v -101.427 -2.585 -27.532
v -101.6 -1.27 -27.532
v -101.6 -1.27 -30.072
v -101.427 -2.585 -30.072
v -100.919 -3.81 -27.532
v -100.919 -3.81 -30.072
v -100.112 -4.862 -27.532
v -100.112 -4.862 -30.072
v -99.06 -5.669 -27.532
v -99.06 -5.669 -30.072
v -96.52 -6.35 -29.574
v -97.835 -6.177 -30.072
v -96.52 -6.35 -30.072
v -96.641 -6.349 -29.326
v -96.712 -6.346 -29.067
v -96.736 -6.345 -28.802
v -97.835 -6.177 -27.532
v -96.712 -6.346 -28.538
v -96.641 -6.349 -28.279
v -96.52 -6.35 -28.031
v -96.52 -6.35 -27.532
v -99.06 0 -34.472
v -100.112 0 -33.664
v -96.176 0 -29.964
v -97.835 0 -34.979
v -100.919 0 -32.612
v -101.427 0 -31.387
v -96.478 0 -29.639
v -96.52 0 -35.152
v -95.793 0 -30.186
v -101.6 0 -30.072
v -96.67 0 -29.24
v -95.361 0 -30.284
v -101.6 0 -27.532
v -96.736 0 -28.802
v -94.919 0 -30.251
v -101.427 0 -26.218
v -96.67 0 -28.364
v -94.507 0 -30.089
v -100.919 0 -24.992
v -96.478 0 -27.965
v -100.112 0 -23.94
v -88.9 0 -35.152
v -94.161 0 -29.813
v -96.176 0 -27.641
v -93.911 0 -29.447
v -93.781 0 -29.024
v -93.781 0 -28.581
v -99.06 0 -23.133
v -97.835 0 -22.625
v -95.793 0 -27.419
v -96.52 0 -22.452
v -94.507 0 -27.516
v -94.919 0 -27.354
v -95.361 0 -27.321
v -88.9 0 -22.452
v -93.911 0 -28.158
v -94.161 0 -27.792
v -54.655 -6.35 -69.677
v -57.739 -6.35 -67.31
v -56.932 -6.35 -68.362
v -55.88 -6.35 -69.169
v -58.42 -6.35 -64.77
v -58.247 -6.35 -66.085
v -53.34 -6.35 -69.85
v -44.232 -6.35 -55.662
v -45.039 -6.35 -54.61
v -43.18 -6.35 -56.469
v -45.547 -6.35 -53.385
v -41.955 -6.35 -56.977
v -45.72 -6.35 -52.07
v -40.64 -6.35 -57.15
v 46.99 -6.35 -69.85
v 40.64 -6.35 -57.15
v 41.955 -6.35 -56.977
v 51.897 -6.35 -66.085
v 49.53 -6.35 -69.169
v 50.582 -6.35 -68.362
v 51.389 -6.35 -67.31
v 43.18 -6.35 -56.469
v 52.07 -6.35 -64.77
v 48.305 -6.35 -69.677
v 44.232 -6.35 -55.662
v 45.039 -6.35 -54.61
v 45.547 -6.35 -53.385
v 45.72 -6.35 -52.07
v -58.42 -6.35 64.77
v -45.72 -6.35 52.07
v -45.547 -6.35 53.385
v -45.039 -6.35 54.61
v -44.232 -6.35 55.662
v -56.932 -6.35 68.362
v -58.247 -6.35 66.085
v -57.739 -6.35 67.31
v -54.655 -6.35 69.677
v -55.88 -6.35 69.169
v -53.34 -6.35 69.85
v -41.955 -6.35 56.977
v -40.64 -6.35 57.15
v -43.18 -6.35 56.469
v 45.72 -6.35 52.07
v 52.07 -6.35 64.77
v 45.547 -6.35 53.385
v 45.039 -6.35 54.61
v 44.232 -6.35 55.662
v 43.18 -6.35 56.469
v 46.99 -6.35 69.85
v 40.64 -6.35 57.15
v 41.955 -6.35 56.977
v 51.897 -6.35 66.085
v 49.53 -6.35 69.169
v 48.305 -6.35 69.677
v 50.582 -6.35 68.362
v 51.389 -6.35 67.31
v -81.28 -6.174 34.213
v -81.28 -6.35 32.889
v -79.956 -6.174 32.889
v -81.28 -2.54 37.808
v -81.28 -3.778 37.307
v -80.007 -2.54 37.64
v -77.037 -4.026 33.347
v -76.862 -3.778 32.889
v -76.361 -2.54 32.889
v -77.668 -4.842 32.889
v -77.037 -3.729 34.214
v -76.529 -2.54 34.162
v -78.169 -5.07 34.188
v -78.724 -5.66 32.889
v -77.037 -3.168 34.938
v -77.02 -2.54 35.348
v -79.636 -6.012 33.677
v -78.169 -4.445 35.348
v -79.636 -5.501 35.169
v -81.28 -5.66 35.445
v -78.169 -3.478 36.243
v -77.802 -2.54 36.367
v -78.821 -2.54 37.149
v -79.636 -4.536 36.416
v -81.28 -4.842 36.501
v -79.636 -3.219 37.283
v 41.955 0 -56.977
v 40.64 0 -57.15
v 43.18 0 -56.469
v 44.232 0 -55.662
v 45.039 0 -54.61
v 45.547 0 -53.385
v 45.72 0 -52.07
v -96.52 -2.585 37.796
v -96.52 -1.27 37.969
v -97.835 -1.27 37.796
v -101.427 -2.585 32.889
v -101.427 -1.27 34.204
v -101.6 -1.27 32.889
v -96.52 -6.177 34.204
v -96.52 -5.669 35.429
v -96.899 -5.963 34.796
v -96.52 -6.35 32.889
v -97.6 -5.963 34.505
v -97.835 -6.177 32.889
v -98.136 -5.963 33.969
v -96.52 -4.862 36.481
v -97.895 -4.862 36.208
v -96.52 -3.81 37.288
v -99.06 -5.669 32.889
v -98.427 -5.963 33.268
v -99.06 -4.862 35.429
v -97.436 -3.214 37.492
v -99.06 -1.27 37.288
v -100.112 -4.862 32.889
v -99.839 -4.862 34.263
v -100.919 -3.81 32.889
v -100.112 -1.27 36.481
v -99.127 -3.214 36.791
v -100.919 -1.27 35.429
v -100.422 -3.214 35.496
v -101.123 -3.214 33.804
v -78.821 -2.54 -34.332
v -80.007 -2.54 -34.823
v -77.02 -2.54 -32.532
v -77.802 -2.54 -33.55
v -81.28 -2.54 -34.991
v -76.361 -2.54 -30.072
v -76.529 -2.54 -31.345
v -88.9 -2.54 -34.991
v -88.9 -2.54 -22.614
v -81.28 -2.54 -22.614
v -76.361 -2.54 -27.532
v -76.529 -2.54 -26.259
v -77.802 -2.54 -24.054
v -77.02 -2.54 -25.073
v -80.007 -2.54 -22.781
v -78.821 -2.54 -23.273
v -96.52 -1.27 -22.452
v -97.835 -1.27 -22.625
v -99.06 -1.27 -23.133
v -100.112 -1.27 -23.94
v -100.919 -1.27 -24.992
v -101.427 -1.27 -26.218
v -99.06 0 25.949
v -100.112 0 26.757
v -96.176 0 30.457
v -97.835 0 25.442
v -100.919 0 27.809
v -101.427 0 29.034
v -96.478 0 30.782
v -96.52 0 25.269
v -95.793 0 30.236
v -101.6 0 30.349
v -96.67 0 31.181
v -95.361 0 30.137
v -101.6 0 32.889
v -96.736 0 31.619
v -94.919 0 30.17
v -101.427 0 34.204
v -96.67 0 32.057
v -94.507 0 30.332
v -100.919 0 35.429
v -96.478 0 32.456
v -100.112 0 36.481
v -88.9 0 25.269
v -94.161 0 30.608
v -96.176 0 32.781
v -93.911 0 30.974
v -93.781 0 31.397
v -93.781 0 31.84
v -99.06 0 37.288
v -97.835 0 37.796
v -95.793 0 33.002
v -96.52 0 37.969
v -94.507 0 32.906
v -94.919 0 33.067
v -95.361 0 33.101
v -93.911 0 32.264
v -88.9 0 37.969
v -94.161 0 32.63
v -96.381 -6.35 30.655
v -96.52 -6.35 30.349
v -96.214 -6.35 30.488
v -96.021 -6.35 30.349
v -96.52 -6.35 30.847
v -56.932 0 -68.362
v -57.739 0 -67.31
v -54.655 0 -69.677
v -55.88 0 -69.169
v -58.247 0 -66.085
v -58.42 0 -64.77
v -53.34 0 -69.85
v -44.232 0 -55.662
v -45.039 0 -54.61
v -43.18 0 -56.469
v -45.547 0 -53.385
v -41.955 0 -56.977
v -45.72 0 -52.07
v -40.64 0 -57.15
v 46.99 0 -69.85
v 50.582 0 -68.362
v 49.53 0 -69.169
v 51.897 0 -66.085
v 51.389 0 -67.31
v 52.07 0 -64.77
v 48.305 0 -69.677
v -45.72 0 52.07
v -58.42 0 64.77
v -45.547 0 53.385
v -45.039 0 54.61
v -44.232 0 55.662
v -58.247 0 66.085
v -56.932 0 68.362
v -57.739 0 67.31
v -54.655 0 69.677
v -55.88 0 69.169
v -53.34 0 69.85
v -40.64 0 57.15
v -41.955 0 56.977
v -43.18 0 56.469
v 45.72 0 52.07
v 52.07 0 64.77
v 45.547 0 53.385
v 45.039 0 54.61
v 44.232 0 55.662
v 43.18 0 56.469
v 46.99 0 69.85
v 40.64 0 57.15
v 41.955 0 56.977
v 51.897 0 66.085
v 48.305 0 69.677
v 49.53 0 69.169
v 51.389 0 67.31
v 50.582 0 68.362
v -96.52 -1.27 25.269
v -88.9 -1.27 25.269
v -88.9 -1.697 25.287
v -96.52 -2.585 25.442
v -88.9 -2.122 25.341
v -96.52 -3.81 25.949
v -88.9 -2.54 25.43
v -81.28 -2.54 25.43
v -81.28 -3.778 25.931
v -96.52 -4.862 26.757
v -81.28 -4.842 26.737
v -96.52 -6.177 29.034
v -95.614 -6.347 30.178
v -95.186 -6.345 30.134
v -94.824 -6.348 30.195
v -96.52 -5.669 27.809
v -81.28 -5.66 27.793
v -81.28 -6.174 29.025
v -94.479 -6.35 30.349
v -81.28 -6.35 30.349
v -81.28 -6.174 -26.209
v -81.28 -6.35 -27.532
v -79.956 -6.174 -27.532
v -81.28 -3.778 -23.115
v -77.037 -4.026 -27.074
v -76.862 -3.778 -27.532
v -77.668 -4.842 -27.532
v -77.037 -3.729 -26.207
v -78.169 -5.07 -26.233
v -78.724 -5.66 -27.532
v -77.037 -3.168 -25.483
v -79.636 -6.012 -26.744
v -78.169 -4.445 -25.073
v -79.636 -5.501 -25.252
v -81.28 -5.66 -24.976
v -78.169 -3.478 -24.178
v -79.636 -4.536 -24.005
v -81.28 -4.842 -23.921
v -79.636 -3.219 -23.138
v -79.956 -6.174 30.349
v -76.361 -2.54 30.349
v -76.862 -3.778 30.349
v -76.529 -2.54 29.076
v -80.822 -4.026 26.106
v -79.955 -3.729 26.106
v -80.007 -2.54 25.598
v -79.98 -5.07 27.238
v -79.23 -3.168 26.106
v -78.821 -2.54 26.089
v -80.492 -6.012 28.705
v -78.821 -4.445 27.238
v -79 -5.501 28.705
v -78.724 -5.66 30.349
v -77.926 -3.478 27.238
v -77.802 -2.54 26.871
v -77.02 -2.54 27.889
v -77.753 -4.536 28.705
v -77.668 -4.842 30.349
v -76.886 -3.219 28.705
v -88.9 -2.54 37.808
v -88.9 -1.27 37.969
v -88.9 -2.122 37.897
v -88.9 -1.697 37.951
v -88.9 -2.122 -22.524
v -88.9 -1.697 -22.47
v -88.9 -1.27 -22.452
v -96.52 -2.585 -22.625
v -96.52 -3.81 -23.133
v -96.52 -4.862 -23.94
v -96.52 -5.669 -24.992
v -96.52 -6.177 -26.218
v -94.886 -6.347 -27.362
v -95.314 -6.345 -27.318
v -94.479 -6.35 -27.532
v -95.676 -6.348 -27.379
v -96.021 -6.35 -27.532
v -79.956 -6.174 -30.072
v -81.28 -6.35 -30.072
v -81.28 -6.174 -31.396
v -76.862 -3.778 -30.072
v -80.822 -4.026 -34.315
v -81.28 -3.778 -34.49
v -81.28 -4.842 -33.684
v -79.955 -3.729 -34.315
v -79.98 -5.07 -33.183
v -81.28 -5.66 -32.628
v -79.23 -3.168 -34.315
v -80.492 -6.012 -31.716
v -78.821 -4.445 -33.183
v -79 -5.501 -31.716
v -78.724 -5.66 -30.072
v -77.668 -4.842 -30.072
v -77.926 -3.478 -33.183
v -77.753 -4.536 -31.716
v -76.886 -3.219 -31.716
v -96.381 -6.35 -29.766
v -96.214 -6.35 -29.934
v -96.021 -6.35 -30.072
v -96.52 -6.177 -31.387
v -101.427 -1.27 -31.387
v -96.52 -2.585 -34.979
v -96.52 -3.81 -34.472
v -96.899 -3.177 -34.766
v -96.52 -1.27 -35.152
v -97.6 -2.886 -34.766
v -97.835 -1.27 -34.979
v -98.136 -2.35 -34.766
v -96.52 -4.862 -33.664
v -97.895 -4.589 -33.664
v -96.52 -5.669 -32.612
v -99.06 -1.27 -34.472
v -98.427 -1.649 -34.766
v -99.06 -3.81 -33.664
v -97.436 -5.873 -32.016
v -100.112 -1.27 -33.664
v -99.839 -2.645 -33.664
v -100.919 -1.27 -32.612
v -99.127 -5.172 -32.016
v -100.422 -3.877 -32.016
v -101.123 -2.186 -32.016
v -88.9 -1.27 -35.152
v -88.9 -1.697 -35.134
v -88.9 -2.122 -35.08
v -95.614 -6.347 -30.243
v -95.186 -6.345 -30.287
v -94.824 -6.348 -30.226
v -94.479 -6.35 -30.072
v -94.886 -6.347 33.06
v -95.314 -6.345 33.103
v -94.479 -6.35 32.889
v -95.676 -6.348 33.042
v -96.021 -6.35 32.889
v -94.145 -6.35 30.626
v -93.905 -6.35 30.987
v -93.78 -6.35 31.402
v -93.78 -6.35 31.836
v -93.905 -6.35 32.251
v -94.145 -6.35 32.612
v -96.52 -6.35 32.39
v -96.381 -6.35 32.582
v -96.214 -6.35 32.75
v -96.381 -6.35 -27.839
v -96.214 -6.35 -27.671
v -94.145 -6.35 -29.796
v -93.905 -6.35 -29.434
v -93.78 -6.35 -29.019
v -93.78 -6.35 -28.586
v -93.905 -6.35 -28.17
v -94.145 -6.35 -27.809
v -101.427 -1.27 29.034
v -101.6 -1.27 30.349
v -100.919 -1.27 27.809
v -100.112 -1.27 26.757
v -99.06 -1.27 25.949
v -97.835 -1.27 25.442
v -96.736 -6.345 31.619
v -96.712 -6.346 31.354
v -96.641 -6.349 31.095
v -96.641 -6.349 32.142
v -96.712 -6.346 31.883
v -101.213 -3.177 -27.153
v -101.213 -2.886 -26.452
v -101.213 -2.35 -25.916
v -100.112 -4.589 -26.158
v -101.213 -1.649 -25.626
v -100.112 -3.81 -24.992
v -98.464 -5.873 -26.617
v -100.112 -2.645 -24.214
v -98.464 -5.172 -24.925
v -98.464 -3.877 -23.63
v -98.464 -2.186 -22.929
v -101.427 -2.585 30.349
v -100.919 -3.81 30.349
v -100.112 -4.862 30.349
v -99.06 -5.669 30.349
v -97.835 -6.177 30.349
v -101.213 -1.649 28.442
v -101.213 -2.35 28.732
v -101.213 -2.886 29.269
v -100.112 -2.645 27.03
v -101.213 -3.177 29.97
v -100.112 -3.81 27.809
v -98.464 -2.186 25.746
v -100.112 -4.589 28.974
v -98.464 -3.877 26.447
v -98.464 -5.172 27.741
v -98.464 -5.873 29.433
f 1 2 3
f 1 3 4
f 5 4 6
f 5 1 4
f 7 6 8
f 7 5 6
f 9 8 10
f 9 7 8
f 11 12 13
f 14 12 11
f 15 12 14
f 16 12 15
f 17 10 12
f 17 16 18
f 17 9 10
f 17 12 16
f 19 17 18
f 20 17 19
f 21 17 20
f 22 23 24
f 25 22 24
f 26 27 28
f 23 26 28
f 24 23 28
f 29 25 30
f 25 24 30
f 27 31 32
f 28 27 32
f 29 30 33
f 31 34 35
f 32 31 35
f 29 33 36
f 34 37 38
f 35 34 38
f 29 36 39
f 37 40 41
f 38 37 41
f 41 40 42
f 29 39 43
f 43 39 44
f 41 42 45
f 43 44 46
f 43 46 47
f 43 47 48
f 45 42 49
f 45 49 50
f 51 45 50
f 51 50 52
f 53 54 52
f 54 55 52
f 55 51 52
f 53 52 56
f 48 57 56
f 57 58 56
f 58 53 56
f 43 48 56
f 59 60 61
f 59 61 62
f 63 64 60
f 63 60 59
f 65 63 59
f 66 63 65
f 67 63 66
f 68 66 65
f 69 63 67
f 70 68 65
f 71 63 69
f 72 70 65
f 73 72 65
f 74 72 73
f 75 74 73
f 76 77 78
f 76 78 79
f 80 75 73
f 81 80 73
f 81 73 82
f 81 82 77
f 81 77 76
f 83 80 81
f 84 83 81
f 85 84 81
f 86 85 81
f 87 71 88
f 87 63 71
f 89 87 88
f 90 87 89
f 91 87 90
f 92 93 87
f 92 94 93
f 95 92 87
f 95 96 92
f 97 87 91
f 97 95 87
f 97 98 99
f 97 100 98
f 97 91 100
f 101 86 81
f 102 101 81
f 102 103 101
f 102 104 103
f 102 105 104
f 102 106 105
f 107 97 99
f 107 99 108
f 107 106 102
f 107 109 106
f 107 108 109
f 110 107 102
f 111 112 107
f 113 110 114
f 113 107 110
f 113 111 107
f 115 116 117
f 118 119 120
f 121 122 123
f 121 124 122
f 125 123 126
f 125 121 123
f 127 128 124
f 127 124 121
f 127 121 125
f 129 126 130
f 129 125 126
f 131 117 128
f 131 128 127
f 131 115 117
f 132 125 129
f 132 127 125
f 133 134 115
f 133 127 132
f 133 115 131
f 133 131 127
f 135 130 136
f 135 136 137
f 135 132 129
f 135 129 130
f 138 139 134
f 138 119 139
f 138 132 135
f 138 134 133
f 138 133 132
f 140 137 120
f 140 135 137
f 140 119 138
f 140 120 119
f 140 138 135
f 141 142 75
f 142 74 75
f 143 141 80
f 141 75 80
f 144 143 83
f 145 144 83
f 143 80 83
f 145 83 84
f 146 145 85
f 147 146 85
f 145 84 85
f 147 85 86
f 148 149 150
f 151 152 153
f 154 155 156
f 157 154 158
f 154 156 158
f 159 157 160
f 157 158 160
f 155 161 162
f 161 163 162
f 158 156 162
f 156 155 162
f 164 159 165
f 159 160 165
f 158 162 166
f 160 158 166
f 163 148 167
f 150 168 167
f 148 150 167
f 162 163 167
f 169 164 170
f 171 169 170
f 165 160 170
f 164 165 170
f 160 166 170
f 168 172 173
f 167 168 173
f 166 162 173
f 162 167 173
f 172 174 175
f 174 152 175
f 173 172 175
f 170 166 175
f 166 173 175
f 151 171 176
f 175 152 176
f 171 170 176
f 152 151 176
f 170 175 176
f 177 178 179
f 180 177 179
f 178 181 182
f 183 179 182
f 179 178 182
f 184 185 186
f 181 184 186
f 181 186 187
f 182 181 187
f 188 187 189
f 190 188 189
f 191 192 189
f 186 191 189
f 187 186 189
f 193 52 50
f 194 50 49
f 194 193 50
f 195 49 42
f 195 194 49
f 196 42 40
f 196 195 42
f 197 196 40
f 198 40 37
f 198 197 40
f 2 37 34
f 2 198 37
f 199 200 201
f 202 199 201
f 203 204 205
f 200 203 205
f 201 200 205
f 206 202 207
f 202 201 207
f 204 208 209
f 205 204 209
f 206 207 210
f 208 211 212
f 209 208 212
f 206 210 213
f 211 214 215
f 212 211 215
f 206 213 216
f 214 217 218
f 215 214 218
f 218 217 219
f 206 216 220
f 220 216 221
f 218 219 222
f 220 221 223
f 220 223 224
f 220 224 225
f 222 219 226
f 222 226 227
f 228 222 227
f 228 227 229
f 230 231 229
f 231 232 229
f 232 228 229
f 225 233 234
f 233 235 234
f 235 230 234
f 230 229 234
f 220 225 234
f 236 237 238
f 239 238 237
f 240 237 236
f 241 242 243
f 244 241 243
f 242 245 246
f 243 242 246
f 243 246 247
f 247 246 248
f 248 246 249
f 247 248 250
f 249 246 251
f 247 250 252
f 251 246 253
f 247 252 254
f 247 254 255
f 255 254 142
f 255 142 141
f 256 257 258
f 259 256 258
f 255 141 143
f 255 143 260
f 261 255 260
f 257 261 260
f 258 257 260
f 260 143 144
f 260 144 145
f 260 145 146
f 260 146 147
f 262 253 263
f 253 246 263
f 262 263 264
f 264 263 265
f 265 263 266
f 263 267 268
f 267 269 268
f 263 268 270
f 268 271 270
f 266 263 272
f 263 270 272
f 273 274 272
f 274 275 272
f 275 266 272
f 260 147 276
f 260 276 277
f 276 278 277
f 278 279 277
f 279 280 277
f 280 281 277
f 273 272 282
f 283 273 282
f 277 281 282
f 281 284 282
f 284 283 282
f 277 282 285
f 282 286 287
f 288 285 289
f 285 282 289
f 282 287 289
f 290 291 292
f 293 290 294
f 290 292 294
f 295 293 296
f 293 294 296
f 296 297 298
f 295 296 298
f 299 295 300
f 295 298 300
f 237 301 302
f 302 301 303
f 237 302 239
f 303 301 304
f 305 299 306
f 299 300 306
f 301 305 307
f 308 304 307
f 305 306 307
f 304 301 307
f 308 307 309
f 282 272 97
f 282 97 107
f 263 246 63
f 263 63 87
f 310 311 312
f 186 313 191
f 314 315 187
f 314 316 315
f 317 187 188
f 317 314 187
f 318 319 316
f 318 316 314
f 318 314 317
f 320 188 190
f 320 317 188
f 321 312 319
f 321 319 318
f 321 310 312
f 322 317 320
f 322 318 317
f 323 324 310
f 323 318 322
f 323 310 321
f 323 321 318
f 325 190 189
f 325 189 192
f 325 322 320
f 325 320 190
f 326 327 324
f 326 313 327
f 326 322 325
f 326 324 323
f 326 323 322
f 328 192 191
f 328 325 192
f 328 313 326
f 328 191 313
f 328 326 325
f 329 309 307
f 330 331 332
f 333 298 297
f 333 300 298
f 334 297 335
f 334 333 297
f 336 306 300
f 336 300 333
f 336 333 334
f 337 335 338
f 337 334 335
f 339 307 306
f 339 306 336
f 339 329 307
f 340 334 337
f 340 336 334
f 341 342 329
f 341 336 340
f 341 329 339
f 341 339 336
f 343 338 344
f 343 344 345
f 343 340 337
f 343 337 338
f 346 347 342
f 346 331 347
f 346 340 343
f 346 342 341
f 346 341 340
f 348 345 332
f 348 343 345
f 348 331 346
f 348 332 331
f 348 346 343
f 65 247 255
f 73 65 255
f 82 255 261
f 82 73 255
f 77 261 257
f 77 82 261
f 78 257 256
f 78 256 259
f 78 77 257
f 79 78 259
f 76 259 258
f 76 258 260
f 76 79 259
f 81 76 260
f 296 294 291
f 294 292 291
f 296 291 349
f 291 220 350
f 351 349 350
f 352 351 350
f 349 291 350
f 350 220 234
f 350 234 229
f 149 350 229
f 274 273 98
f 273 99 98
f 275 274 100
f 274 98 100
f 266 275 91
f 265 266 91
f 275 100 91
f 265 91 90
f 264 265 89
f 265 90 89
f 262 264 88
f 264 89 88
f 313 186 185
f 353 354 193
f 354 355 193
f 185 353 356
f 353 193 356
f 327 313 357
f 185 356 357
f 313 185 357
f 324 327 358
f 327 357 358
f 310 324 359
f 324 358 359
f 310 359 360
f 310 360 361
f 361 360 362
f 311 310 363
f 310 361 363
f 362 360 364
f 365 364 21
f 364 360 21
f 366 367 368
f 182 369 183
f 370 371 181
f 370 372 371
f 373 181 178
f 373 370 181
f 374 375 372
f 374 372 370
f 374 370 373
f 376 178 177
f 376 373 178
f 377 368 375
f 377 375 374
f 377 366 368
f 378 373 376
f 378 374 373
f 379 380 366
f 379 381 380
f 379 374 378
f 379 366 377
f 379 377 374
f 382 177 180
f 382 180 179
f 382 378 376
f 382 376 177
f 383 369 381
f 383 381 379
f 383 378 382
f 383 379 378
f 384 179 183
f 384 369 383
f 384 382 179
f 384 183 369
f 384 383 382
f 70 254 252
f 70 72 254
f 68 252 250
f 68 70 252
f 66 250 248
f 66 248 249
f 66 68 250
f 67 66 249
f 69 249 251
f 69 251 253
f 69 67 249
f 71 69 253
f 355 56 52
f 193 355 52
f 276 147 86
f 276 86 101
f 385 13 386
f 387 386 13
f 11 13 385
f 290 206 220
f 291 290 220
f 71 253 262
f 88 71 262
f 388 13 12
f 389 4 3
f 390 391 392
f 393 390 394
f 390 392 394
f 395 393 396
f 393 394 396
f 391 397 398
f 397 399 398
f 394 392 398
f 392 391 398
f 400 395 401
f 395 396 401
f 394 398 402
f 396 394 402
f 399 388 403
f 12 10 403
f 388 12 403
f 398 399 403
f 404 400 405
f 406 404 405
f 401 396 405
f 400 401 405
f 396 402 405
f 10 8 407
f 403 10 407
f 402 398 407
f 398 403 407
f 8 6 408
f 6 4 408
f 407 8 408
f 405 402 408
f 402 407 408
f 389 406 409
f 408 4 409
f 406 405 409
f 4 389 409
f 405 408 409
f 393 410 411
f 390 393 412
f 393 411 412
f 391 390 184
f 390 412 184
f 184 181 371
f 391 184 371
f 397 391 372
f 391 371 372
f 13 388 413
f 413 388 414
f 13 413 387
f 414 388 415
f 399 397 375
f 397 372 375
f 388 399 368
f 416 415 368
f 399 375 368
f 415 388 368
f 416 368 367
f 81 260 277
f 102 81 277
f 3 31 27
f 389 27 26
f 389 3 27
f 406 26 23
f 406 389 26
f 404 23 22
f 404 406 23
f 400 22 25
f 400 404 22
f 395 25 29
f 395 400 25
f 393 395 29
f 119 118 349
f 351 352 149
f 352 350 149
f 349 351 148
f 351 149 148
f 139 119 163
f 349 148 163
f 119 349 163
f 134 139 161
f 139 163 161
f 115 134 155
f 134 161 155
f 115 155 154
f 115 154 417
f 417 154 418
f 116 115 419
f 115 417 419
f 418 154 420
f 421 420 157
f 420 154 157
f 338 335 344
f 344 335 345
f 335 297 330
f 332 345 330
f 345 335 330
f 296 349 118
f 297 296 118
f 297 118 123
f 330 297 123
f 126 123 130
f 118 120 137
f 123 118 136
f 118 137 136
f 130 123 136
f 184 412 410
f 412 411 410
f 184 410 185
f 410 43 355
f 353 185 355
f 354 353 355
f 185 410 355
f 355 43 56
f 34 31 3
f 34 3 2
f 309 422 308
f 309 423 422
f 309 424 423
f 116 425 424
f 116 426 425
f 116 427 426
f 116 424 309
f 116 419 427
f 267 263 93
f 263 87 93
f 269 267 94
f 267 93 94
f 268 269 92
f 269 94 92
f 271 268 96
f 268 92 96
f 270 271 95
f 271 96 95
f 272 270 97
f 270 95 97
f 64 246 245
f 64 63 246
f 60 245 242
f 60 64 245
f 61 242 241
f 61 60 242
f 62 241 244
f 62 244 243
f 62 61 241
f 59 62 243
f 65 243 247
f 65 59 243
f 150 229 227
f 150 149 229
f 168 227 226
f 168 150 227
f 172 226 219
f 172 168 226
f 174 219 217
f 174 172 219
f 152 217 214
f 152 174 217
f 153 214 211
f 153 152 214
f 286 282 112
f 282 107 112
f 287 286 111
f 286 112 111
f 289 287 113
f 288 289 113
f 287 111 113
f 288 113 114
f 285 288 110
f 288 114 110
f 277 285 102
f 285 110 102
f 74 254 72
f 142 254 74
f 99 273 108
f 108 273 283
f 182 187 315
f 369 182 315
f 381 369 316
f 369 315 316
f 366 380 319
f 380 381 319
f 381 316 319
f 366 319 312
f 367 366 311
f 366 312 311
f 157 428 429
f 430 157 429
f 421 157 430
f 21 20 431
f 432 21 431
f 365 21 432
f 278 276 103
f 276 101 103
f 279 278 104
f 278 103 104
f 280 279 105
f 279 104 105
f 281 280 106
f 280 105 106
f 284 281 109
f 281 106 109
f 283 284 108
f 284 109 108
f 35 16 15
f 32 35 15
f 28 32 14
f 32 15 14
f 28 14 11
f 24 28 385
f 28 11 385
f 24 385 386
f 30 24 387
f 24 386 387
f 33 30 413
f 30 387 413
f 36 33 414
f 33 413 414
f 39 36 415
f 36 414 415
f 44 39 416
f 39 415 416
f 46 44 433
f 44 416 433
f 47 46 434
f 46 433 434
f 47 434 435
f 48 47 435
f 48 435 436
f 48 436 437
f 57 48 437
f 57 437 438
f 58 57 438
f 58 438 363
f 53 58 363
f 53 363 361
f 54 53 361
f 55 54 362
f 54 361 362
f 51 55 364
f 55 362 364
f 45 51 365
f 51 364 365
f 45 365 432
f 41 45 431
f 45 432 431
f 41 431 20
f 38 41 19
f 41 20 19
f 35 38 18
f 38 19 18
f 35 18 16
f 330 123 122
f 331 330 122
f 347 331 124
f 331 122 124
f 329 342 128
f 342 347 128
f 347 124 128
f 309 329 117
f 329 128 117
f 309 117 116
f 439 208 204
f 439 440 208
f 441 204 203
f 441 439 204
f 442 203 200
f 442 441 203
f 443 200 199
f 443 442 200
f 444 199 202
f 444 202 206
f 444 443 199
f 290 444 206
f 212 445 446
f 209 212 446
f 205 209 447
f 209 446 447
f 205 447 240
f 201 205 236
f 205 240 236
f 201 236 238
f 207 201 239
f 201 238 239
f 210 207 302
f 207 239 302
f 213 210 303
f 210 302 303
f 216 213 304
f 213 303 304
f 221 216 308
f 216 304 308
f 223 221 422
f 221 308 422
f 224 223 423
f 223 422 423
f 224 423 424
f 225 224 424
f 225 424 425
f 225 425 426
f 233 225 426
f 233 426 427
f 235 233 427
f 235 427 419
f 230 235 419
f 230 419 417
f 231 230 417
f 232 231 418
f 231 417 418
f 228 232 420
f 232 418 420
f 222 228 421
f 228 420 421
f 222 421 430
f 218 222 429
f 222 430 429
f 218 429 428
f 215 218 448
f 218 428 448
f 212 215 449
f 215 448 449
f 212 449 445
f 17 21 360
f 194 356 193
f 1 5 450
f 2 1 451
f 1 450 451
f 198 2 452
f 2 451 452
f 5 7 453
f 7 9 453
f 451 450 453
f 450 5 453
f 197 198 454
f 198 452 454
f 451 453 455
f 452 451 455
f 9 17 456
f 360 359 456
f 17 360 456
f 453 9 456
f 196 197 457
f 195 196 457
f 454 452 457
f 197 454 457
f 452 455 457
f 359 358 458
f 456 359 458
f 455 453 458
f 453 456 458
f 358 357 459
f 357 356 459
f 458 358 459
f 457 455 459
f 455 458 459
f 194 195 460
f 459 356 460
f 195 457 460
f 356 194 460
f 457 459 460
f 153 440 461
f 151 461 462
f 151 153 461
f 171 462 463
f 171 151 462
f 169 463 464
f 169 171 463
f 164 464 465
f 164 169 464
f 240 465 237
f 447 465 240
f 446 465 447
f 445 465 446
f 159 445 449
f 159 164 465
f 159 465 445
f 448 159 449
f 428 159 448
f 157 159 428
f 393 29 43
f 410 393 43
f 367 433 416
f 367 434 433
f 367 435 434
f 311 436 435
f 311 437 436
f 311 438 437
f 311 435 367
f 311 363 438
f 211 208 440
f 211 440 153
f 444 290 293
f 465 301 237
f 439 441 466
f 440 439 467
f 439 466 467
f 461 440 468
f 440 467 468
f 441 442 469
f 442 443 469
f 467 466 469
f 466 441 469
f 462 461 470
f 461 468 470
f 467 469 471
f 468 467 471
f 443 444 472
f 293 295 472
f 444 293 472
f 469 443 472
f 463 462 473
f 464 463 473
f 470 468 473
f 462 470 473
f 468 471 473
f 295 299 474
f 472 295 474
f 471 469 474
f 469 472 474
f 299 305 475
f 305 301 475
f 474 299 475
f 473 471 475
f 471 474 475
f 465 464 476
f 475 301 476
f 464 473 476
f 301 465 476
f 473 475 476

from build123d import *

# Parameters (mm, degrees)
F0_W     = 110.49
F0_H     = 139.7
F0_W_2   = 91.44
F0_H_2   = 114.3
F2_DEPTH = 6.35
F3_R     = 5.08
F1_W     = 0.0457762241
F1_H     = 12.7
F1_W_2   = 12.6542237759
F4_DEPTH = 6.35
F1_W_3   = 12.7
F1_H_2   = 12.6999970629
F5_R     = 5.08
F6_R     = 5.08
F7_W     = 12.7
F7_H     = 15.24
F8_DEPTH = 2.54
F9_DEPTH = 2.54
F11_D    = 2.9718
F12_D    = 2.9718


# Not quite as in the source:
# - a feature of the source that left no trace in its solid (it failed there, or was rolled back) is left out


with BuildPart() as f2:
    # F0 (on Front) → F2 (new body)
    with BuildSketch(Plane.XZ):
        with Locations((-3.175, 0)):
            Rectangle(F0_W, F0_H)
        Rectangle(F0_W_2, F0_H_2, mode=Mode.SUBTRACT)
    extrude(amount=F2_DEPTH)

    # F3
    f3_edges = [f2.edges().sort_by_distance(p)[0] for p in [
        (-58.42, -3.175, 69.85),
        (-58.42, -3.175, -69.85),
        (52.07, -3.175, -69.85),
        (52.07, -3.175, 69.85),
        (-45.72, -3.175, 57.15),
        (45.72, -3.175, 57.15),
        (45.72, -3.175, -57.15),
        (-45.72, -3.175, -57.15),
    ]]
    fillet(f3_edges, radius=F3_R)


with BuildPart() as f4:
    # F1 (on Front) → F4 (new body)
    with BuildSketch(Plane.XZ):
        with Locations((-76.2228881121, 31.618843414)):
            Rectangle(F1_W, F1_H)
        with Locations((-82.5728881121, 31.618843414)):
            Rectangle(F1_W_2, F1_H)
        with Locations((-88.9228881121, 31.618843414)):
            Rectangle(F1_W, F1_H)
        with Locations((-95.2728881121, 31.618843414)):
            Rectangle(F1_W_2, F1_H)
    extrude(amount=F4_DEPTH)

    # F5
    f5_edges = [f4.edges().sort_by_distance(p)[0] for p in [
        (-101.6, -3.175, 37.968843),
        (-88.9, -6.35, 37.968843),
        (-76.2, -6.35, 31.618843),
        (-88.9, -6.35, 25.268843),
        (-76.2, -3.175, 25.268843),
        (-101.6, -3.175, 25.268843),
        (-76.2, -3.175, 37.968843),
        (-101.6, -6.35, 31.618843),
    ]]
    fillet(f5_edges, radius=F5_R)

    # F7 (on Front) → F8 (cut)
    with BuildSketch(Plane.XZ):
        with Locations((-82.55, 31.543379275)):
            Rectangle(F7_W, F7_H)
    extrude(amount=F8_DEPTH, mode=Mode.SUBTRACT)

    # F11 (through all)
    with Locations(Plane(origin=(0, 0, 0), x_dir=(1, 0, 0), z_dir=(0, 1, 0))):
        with Locations((-95.25, -31.618843414)):
            Hole(F11_D / 2)


with BuildPart() as f4b:
    # F1 (on Front) → F4, piece 2 (new body)
    with BuildSketch(Plane.XZ):
        with Locations((-82.55, -28.8023503282)):
            Rectangle(F1_W_3, F1_H_2)
        with Locations((-95.25, -28.8023503282)):
            Rectangle(F1_W_3, F1_H_2)
    extrude(amount=F4_DEPTH)

    # F6
    f6_edges = [f4b.edges().sort_by_distance(p)[0] for p in [
        (-88.9, -6.35, -22.452352),
        (-76.2, -6.35, -28.80235),
        (-101.6, -6.35, -28.80235),
        (-88.9, -6.35, -35.152349),
        (-101.6, -3.175, -35.152349),
        (-101.6, -3.175, -22.452352),
        (-76.2, -3.175, -35.152349),
        (-76.2, -3.175, -22.452352),
    ]]
    fillet(f6_edges, radius=F6_R)

    # F7 (on Front) → F9 (cut)
    with BuildSketch(Plane.XZ):
        with Locations((-82.55, 31.543379275)):
            Rectangle(F7_W, F7_H)
        with Locations((-82.55, -28.520518263)):
            Rectangle(F7_W, F7_H)
    extrude(amount=F9_DEPTH, mode=Mode.SUBTRACT)

    # F12 (through all)
    with Locations(Plane(origin=(0, 0, 0), x_dir=(1, 0, 0), z_dir=(0, 1, 0))):
        with Locations((-95.25, 28.8023517968)):
            Hole(F12_D / 2)


solid = Compound([f2.part, f4.part, f4b.part])
